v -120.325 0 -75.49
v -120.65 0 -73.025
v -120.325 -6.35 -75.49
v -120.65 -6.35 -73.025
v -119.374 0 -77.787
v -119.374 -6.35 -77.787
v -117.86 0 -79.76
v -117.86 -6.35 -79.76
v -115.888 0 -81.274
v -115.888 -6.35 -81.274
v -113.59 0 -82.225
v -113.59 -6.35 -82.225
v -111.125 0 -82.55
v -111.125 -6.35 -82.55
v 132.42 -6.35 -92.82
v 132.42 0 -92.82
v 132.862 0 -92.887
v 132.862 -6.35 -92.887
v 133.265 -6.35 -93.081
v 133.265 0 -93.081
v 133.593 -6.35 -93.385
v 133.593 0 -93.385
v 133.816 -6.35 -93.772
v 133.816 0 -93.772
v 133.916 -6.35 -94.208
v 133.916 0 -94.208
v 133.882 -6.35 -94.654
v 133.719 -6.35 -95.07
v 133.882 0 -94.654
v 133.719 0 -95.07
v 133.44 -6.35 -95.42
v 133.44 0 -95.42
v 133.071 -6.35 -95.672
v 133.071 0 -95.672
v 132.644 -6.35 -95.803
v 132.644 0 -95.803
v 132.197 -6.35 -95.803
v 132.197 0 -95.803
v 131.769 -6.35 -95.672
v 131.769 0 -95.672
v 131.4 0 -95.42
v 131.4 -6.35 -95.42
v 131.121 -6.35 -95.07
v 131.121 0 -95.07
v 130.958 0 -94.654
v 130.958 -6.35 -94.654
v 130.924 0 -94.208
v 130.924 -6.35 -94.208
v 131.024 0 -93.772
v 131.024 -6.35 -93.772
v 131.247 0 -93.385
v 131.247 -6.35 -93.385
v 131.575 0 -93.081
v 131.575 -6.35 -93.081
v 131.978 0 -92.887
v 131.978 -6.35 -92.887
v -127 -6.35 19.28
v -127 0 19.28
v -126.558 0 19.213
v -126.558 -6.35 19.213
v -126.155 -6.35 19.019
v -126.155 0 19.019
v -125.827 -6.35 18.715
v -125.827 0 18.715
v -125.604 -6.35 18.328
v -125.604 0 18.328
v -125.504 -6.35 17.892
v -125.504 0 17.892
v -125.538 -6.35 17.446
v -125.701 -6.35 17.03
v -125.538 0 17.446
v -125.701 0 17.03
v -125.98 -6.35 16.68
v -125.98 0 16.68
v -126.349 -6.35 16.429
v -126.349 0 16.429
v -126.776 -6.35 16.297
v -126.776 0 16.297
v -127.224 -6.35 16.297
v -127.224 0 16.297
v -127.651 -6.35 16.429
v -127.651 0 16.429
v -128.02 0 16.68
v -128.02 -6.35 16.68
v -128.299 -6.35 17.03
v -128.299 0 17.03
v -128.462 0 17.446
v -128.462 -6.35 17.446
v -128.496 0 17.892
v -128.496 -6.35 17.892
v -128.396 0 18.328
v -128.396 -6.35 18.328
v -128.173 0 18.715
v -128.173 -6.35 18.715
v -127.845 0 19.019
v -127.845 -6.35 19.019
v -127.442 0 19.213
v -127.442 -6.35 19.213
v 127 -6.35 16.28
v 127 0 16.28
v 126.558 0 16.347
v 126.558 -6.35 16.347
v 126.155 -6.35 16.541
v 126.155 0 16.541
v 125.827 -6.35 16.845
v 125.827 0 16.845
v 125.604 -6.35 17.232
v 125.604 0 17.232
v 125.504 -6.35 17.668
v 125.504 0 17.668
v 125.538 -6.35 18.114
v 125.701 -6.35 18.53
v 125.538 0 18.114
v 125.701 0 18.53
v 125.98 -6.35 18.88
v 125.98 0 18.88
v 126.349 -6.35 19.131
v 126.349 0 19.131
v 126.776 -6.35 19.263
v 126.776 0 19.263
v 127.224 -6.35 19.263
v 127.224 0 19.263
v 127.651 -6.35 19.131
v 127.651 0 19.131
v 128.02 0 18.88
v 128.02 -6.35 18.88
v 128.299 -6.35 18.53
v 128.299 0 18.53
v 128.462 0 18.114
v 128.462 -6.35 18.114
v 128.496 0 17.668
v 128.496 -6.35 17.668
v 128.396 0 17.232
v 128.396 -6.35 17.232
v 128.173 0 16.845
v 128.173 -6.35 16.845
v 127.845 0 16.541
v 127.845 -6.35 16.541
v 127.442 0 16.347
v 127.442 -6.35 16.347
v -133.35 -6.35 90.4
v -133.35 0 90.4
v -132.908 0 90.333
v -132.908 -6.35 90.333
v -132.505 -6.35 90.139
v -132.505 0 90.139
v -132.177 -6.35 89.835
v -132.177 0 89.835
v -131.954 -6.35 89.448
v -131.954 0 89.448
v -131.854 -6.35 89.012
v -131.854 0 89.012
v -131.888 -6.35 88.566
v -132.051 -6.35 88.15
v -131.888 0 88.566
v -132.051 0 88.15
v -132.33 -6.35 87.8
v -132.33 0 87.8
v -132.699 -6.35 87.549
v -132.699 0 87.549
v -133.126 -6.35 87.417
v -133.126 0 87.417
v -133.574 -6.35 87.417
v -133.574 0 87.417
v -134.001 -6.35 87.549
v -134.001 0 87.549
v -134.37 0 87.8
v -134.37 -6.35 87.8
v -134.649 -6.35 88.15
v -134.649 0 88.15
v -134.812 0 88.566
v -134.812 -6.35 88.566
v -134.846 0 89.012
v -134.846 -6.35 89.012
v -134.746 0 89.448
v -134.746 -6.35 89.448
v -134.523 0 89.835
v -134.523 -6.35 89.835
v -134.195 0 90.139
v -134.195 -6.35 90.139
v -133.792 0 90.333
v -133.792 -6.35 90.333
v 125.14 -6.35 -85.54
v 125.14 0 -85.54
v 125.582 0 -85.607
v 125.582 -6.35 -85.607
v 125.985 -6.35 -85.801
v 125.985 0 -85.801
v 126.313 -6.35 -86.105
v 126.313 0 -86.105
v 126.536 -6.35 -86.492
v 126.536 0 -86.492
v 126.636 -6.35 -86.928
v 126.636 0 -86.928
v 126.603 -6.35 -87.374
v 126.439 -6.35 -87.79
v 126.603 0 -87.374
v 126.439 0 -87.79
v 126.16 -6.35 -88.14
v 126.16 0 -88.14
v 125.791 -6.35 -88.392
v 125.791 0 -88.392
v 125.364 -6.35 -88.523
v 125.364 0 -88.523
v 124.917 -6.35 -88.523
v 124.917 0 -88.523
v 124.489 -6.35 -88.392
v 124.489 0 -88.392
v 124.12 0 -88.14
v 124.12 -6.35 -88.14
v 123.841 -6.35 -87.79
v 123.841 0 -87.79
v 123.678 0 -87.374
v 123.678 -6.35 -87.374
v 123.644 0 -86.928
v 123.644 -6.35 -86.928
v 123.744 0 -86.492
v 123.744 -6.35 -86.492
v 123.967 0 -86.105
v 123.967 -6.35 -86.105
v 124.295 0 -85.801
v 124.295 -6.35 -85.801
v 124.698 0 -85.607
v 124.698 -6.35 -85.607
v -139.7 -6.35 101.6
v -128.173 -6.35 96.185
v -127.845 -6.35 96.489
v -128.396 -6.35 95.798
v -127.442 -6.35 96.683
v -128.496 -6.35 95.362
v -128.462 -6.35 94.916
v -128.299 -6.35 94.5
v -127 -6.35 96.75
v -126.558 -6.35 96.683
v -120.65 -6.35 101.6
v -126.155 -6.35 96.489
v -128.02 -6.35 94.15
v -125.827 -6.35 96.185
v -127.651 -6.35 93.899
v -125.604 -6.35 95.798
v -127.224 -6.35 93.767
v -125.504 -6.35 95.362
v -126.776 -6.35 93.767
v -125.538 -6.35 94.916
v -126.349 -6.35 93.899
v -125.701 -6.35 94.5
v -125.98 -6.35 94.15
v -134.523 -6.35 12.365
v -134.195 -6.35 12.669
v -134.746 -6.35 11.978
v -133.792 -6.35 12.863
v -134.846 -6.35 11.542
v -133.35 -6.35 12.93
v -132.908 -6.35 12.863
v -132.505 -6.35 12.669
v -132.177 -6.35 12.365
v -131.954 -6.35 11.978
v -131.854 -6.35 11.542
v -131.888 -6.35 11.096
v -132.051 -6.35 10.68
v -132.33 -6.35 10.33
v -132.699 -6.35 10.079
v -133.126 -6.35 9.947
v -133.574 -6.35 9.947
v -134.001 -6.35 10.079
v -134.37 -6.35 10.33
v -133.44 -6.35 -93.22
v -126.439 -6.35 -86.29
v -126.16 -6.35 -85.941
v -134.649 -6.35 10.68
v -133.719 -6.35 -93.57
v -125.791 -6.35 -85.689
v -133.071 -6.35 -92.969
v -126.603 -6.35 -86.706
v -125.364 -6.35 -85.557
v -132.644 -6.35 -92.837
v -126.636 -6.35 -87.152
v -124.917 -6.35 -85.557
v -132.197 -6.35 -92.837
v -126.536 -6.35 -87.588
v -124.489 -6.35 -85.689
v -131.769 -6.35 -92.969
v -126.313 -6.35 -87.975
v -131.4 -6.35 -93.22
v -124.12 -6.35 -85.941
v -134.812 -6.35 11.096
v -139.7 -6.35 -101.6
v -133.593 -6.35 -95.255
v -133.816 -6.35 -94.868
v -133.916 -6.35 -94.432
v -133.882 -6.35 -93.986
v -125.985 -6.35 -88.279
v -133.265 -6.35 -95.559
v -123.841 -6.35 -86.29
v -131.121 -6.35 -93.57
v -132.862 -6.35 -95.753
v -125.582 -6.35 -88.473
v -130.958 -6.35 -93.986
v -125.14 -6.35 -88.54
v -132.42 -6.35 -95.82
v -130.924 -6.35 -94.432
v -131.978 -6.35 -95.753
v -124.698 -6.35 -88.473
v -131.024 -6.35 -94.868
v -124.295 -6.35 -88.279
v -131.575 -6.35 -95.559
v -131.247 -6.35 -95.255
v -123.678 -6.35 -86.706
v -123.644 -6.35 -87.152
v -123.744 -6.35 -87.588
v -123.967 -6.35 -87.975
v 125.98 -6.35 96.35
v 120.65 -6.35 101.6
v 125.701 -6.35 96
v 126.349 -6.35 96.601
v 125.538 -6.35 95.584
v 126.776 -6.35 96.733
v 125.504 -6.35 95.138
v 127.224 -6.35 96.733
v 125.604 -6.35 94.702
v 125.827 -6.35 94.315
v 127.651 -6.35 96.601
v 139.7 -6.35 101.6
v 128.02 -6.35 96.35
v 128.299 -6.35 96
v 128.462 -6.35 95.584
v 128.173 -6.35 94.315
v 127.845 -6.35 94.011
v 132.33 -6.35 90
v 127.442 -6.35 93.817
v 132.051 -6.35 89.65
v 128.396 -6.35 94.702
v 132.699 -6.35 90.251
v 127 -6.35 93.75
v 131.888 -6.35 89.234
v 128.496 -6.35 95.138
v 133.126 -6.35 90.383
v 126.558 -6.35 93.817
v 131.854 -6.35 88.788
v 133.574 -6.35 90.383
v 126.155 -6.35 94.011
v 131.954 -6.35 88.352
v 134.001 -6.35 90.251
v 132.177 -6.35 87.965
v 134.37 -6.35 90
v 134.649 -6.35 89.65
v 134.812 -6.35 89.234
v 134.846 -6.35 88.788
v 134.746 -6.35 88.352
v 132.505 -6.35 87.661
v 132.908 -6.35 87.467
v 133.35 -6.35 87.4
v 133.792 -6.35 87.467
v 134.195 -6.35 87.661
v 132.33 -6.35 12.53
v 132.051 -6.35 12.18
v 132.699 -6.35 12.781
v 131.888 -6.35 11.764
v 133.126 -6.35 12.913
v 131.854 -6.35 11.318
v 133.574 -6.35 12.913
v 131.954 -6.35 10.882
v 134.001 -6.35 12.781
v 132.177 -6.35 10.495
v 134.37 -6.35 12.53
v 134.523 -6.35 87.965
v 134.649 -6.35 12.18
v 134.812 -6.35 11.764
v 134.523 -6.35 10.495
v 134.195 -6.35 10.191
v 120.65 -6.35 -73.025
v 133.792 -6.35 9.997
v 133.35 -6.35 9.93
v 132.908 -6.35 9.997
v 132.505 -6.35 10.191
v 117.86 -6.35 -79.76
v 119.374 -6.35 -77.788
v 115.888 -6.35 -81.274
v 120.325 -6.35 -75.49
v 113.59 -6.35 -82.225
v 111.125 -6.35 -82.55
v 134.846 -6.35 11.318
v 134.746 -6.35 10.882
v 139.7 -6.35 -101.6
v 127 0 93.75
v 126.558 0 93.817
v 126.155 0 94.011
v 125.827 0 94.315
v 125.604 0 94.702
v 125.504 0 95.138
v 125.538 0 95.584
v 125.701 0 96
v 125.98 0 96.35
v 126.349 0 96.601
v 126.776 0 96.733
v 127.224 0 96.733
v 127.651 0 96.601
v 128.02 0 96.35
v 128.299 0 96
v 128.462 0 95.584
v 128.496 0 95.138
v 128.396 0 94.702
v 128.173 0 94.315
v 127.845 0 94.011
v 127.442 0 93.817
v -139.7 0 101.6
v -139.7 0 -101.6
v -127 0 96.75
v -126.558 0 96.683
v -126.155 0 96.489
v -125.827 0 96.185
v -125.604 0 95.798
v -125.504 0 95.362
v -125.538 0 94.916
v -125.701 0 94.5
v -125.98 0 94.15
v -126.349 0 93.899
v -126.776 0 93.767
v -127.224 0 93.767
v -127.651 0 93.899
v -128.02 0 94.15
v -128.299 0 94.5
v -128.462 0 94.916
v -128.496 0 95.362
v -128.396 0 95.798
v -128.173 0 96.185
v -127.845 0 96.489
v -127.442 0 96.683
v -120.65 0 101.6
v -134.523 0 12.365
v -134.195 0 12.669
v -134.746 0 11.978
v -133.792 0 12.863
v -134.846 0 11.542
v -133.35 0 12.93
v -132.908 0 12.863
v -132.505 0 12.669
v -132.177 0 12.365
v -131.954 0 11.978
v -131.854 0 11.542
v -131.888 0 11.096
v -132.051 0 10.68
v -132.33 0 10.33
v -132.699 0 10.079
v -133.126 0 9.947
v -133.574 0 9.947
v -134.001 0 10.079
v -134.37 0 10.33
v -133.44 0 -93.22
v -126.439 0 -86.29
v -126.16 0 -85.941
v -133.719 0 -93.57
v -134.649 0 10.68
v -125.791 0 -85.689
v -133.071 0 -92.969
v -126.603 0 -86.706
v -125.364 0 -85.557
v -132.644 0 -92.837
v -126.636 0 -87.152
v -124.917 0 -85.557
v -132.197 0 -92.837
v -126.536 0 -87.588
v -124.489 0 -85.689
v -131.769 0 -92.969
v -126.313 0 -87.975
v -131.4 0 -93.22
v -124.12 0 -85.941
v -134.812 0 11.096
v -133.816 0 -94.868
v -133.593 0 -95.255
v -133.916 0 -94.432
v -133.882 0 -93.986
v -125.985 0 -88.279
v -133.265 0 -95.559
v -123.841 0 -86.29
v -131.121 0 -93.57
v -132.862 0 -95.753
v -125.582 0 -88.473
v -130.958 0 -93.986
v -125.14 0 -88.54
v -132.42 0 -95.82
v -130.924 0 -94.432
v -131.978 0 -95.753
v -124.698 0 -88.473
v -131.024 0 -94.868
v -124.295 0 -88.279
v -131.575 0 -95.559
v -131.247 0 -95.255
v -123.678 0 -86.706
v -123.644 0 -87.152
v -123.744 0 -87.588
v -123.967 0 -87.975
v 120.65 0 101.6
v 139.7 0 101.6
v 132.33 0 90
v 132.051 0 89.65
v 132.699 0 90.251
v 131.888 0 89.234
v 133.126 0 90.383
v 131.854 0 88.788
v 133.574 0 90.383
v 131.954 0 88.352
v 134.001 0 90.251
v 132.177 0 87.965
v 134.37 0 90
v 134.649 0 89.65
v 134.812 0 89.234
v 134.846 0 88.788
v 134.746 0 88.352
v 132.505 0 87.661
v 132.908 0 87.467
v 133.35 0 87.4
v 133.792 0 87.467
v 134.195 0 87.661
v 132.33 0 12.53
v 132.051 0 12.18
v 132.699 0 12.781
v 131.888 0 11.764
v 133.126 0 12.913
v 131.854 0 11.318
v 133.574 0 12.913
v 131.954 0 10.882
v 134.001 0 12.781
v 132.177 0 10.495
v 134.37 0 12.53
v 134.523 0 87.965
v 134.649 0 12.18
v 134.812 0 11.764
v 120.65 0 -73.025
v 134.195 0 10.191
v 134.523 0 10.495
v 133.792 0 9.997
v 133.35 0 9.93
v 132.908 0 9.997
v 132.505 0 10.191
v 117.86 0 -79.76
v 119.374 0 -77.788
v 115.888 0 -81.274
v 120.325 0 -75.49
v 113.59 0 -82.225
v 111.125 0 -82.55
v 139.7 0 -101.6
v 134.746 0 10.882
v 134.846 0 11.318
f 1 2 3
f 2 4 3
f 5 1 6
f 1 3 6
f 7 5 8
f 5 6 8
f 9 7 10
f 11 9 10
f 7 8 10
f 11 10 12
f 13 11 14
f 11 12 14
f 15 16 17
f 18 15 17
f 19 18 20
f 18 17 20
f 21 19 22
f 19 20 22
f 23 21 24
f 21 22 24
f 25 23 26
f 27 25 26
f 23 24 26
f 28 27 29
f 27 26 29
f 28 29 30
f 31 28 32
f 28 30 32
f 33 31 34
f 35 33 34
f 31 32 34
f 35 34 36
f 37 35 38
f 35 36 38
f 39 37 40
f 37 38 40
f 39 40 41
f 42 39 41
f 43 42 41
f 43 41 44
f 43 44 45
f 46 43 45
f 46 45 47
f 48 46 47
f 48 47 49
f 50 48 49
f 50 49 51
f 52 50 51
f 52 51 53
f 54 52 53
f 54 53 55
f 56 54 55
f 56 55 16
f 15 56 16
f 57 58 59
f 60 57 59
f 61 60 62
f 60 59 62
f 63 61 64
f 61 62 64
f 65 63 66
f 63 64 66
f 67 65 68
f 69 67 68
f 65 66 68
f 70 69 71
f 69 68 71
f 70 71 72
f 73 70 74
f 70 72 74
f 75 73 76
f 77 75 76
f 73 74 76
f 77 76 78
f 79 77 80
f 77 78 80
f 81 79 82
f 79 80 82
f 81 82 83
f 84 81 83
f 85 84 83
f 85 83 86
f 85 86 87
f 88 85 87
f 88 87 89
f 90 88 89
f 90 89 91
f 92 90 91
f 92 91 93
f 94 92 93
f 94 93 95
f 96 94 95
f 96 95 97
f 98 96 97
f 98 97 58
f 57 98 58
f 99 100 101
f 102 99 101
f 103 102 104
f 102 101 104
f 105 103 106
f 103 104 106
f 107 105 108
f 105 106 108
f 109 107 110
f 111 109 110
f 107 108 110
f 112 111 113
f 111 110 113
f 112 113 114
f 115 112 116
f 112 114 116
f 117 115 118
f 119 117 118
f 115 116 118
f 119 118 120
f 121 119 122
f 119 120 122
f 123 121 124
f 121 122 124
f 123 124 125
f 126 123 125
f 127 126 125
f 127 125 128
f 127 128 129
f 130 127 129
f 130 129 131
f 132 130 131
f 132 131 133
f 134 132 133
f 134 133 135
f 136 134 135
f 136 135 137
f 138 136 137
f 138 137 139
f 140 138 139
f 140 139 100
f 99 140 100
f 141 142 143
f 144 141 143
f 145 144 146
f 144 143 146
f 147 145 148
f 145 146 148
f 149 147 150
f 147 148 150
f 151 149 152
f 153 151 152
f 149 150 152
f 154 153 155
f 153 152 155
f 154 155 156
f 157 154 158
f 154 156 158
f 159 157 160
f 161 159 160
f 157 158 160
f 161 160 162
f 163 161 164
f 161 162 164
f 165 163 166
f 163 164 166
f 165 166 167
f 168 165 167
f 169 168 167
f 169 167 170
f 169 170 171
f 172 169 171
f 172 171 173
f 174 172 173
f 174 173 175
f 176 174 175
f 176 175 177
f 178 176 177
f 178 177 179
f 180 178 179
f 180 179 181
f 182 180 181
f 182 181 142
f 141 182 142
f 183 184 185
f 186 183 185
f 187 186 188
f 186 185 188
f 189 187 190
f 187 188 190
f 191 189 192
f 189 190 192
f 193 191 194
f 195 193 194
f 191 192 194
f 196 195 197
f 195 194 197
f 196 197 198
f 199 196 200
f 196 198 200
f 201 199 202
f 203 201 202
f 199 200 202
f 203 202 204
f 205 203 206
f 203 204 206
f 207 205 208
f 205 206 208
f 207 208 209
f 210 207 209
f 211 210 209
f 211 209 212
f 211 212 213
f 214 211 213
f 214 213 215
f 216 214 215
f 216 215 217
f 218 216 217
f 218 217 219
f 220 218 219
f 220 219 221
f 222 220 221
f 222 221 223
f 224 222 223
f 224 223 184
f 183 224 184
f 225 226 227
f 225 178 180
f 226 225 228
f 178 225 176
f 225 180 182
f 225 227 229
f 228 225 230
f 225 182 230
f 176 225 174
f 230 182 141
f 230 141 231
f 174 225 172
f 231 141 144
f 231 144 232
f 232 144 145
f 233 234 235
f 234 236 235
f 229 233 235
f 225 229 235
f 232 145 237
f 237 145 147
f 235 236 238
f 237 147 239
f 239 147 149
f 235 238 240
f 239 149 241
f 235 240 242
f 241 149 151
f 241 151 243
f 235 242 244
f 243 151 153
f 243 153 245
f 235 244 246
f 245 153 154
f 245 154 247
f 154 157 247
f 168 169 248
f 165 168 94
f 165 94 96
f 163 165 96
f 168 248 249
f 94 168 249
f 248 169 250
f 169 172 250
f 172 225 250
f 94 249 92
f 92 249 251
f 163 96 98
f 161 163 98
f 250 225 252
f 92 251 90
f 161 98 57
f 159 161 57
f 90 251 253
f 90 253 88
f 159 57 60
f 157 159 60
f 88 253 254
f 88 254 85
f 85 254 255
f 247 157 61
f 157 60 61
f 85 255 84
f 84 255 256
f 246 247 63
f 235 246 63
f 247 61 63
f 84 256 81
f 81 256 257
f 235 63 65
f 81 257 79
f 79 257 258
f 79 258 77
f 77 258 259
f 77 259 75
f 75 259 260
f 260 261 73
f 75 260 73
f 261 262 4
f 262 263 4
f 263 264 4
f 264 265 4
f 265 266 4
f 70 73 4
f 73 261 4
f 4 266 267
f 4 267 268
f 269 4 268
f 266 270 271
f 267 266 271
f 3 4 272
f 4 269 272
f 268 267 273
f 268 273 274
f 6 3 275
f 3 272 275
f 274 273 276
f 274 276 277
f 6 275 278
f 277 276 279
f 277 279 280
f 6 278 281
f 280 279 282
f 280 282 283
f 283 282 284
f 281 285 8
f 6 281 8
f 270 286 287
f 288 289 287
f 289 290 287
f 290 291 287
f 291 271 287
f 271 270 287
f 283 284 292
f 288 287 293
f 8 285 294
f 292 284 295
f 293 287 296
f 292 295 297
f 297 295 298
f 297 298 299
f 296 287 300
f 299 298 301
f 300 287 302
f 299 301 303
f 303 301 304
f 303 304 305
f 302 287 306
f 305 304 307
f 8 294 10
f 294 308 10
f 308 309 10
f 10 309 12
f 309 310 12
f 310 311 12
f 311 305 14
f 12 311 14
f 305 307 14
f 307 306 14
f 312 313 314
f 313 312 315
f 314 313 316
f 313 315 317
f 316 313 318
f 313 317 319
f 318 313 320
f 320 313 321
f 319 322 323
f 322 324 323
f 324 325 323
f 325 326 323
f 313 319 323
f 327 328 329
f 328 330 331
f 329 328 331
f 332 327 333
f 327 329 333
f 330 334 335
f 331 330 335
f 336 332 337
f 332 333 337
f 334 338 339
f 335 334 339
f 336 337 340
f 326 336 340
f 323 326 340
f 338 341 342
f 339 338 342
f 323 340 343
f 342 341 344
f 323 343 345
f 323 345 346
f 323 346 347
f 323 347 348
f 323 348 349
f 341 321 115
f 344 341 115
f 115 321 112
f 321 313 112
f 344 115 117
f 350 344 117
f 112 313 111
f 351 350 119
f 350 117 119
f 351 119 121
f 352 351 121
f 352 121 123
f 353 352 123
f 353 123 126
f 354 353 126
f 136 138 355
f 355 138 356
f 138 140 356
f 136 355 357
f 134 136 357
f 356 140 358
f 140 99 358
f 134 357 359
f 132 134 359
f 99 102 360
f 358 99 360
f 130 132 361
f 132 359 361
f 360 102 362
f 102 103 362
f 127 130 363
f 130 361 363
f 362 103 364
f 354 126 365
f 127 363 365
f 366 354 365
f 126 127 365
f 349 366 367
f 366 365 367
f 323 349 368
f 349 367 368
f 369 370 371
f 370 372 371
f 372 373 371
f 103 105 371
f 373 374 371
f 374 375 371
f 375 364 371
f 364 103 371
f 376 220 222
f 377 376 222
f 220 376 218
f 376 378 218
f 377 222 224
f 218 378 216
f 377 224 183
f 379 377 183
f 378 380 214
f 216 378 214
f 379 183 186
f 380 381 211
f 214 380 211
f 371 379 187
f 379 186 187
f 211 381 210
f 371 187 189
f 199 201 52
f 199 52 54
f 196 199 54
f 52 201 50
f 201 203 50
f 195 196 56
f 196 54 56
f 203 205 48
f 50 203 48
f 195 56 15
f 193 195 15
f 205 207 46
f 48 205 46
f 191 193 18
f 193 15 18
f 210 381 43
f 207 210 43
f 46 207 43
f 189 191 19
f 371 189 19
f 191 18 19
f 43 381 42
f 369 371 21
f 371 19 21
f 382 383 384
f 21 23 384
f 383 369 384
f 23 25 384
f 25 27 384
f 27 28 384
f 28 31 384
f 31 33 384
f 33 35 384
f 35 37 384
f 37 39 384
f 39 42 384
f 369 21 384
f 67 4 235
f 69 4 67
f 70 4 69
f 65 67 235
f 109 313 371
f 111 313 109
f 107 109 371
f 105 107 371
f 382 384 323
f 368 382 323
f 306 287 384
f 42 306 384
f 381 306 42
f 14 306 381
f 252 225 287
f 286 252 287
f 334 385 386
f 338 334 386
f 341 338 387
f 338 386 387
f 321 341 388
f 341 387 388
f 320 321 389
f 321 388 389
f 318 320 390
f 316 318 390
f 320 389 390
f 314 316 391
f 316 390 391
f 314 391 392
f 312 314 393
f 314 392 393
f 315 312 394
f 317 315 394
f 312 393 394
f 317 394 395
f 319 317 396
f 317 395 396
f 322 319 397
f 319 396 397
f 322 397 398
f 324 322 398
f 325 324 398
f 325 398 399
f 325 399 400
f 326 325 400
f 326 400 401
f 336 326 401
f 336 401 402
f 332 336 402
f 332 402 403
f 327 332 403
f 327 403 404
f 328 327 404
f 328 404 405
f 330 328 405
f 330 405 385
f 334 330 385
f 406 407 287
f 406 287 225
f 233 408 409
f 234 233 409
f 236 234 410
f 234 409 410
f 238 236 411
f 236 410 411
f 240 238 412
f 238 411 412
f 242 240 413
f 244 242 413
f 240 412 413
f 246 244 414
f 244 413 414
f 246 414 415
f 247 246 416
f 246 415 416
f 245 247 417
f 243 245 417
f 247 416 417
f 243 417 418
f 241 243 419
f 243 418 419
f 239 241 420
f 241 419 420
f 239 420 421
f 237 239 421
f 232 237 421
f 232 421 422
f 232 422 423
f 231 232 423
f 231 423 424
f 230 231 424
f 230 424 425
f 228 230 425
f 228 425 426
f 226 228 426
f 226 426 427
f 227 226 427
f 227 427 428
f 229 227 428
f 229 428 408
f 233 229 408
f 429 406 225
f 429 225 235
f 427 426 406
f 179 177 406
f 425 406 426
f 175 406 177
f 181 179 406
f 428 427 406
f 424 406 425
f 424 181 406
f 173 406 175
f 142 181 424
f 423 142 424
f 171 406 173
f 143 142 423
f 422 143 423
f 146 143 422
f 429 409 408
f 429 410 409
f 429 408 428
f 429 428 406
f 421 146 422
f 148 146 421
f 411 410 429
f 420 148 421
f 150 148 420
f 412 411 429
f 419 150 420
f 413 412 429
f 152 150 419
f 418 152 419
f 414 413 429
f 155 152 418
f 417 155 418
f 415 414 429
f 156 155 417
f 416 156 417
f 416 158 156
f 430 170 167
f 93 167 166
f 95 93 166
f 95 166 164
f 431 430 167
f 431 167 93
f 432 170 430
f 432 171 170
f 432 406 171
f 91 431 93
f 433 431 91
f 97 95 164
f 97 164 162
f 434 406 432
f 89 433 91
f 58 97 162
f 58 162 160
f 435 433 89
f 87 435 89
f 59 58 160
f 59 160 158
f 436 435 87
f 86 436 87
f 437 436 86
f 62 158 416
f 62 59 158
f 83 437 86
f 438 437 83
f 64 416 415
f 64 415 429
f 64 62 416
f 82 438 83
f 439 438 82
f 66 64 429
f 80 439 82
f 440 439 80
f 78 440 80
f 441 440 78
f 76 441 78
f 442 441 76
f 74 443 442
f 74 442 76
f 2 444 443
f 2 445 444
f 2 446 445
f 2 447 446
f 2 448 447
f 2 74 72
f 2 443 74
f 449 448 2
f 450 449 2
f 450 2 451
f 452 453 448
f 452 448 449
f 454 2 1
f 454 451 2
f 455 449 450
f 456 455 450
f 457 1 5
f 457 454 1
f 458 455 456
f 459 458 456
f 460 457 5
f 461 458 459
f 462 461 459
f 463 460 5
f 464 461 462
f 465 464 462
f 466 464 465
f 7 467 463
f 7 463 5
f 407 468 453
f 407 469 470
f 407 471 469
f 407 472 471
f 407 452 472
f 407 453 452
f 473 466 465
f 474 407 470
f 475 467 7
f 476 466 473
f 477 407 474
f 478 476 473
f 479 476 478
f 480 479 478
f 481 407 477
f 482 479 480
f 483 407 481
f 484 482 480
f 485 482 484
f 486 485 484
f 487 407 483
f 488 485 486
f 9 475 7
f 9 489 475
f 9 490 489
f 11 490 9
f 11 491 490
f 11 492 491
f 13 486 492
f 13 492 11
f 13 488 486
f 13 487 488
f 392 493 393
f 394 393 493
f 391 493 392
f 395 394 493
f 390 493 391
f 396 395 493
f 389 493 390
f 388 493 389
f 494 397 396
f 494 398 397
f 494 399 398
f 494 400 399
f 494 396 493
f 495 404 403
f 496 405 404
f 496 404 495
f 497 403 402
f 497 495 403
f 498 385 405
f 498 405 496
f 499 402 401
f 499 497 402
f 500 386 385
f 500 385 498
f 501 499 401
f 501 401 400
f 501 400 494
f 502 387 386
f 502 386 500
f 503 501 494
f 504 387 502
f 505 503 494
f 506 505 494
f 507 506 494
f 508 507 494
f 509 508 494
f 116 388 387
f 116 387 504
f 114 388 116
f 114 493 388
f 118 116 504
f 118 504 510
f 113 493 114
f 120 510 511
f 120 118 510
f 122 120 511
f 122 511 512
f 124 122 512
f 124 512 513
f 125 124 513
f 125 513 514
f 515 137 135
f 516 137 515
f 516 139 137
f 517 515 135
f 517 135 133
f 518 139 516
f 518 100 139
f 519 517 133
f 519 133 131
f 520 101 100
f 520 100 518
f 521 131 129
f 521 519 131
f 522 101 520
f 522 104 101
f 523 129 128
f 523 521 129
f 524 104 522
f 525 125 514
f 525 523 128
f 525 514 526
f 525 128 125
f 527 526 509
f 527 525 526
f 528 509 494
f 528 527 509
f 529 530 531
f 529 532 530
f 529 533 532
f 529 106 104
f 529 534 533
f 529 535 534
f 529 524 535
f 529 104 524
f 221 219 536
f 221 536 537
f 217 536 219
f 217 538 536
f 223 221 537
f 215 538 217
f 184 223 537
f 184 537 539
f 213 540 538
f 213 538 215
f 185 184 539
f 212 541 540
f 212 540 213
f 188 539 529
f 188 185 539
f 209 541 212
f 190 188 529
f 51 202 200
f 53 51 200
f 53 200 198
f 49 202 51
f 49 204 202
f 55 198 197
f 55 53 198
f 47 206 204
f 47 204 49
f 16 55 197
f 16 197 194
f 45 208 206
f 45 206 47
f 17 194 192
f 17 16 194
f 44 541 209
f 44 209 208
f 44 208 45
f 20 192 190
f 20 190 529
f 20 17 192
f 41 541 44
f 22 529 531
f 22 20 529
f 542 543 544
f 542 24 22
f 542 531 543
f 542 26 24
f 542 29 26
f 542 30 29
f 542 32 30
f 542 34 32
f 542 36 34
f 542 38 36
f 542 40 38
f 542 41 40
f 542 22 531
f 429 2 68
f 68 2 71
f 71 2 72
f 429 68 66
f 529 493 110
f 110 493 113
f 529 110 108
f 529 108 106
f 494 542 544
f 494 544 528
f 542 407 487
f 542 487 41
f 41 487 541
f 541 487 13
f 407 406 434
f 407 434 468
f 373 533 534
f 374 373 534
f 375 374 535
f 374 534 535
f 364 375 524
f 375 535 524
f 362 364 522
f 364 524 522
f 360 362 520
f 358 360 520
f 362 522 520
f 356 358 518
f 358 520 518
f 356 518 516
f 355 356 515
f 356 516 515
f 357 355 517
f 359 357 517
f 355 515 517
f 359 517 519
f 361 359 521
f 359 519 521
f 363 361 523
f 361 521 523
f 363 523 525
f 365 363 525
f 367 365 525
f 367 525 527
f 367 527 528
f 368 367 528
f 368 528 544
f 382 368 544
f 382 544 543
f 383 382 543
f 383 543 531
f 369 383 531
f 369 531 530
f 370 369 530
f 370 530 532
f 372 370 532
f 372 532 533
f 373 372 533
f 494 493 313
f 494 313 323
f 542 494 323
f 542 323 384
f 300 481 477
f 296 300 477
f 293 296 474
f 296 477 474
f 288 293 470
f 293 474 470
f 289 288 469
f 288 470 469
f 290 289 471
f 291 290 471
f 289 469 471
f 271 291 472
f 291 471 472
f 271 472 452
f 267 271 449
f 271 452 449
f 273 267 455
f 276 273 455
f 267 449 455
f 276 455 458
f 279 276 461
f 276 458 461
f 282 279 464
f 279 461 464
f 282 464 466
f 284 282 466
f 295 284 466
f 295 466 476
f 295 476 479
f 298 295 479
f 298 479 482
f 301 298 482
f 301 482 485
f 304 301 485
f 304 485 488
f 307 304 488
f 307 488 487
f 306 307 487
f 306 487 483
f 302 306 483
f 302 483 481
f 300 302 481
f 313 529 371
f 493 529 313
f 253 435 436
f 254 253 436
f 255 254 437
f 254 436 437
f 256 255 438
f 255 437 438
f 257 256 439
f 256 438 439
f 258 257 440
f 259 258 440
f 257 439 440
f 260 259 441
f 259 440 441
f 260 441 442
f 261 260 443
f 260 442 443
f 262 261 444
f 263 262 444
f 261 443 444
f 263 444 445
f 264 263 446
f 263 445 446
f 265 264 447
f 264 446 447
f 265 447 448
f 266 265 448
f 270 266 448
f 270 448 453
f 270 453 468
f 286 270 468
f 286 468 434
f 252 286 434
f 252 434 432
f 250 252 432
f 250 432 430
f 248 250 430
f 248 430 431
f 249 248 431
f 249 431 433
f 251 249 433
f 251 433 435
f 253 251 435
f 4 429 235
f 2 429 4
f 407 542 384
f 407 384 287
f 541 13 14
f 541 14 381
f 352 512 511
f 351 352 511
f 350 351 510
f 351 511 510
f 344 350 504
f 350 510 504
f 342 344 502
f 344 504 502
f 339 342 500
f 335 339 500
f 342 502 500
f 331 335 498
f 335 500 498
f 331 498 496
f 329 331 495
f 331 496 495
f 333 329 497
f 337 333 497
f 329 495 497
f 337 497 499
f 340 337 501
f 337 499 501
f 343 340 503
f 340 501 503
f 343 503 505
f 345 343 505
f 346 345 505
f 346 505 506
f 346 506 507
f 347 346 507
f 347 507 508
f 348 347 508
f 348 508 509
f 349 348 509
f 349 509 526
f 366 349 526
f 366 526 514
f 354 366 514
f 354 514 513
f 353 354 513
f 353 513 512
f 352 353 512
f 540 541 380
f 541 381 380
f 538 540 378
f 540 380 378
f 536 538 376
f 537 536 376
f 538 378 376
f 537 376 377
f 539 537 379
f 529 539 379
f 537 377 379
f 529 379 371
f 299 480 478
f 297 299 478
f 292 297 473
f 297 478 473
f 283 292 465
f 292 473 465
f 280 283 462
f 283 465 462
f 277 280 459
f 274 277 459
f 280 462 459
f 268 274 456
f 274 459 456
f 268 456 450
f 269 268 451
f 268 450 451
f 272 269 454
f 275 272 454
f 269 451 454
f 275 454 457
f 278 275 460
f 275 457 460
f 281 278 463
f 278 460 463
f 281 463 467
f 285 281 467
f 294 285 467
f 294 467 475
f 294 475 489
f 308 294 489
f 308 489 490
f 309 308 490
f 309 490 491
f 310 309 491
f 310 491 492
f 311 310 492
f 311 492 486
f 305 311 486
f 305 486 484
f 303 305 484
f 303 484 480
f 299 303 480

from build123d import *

# Parameters (mm, degrees)
BOSS_EXTRUDE1_DEPTH = 6.35
FILLET1_R           = 9.525
SKETCH2_R           = 1.5
CUT_EXTRUDE1_DEPTH  = 173.855351378
LPATTERN1_COUNT     = 2
LPATTERN1_PITCH     = 77.47


with BuildPart() as part:
    # Sketch1 → Boss-Extrude1 (new body)
    with BuildSketch(Plane(origin=(0, 0, 0), x_dir=(1, 0, 0), z_dir=(0, 1, 0))):
        Polygon((-120.65, -101.6), (-120.65, 82.55), (120.65, 82.55), (120.65, -101.6), (139.7, -101.6), (139.7, 101.6), (-139.7, 101.6), (-139.7, -101.6), align=None)
    extrude(amount=-BOSS_EXTRUDE1_DEPTH)

    # Fillet1
    fillet1_edges = [part.edges().sort_by_distance(p)[0] for p in [
        (120.65, -3.175, -82.55),
        (-120.65, -3.175, -82.55),
    ]]
    fillet(fillet1_edges, radius=FILLET1_R)

    # Sketch2 → Cut-Extrude1 (cut, through all)
    with BuildSketch(Plane(origin=(0, 0, 0), x_dir=(1, 0, 0), z_dir=(0, 1, 0))):
        with Locations(Location((-133.35, -88.9, 0), (0, 0, 270))):
            Circle(SKETCH2_R)
        with Locations(Location((-127, -95.25, 0), (0, 0, 270))):
            Circle(SKETCH2_R)
        with Locations(Location((133.35, -88.9, 0), (0, 0, 90))):
            Circle(SKETCH2_R)
        with Locations(Location((127, -95.25, 0), (0, 0, 90))):
            Circle(SKETCH2_R)
        with Locations(Location((132.42006403, 94.32006403, 0), (0, 0, 270))):
            Circle(SKETCH2_R)
        with Locations(Location((125.140128061, 87.040128061, 0), (0, 0, 270))):
            Circle(SKETCH2_R)
        with Locations(Location((-125.140128061, 87.040128061, 0), (0, 0, 90))):
            Circle(SKETCH2_R)
        with Locations(Location((-132.42006403, 94.32006403, 0), (0, 0, 90))):
            Circle(SKETCH2_R)
    cut_extrude1 = extrude(amount=-CUT_EXTRUDE1_DEPTH, mode=Mode.SUBTRACT)

    # LPattern1: Cut-Extrude1 ×2
    with Locations(*[(0, 0, -i * LPATTERN1_PITCH) for i in range(1, LPATTERN1_COUNT)]):
        add(cut_extrude1, mode=Mode.SUBTRACT)


solid = part.part
